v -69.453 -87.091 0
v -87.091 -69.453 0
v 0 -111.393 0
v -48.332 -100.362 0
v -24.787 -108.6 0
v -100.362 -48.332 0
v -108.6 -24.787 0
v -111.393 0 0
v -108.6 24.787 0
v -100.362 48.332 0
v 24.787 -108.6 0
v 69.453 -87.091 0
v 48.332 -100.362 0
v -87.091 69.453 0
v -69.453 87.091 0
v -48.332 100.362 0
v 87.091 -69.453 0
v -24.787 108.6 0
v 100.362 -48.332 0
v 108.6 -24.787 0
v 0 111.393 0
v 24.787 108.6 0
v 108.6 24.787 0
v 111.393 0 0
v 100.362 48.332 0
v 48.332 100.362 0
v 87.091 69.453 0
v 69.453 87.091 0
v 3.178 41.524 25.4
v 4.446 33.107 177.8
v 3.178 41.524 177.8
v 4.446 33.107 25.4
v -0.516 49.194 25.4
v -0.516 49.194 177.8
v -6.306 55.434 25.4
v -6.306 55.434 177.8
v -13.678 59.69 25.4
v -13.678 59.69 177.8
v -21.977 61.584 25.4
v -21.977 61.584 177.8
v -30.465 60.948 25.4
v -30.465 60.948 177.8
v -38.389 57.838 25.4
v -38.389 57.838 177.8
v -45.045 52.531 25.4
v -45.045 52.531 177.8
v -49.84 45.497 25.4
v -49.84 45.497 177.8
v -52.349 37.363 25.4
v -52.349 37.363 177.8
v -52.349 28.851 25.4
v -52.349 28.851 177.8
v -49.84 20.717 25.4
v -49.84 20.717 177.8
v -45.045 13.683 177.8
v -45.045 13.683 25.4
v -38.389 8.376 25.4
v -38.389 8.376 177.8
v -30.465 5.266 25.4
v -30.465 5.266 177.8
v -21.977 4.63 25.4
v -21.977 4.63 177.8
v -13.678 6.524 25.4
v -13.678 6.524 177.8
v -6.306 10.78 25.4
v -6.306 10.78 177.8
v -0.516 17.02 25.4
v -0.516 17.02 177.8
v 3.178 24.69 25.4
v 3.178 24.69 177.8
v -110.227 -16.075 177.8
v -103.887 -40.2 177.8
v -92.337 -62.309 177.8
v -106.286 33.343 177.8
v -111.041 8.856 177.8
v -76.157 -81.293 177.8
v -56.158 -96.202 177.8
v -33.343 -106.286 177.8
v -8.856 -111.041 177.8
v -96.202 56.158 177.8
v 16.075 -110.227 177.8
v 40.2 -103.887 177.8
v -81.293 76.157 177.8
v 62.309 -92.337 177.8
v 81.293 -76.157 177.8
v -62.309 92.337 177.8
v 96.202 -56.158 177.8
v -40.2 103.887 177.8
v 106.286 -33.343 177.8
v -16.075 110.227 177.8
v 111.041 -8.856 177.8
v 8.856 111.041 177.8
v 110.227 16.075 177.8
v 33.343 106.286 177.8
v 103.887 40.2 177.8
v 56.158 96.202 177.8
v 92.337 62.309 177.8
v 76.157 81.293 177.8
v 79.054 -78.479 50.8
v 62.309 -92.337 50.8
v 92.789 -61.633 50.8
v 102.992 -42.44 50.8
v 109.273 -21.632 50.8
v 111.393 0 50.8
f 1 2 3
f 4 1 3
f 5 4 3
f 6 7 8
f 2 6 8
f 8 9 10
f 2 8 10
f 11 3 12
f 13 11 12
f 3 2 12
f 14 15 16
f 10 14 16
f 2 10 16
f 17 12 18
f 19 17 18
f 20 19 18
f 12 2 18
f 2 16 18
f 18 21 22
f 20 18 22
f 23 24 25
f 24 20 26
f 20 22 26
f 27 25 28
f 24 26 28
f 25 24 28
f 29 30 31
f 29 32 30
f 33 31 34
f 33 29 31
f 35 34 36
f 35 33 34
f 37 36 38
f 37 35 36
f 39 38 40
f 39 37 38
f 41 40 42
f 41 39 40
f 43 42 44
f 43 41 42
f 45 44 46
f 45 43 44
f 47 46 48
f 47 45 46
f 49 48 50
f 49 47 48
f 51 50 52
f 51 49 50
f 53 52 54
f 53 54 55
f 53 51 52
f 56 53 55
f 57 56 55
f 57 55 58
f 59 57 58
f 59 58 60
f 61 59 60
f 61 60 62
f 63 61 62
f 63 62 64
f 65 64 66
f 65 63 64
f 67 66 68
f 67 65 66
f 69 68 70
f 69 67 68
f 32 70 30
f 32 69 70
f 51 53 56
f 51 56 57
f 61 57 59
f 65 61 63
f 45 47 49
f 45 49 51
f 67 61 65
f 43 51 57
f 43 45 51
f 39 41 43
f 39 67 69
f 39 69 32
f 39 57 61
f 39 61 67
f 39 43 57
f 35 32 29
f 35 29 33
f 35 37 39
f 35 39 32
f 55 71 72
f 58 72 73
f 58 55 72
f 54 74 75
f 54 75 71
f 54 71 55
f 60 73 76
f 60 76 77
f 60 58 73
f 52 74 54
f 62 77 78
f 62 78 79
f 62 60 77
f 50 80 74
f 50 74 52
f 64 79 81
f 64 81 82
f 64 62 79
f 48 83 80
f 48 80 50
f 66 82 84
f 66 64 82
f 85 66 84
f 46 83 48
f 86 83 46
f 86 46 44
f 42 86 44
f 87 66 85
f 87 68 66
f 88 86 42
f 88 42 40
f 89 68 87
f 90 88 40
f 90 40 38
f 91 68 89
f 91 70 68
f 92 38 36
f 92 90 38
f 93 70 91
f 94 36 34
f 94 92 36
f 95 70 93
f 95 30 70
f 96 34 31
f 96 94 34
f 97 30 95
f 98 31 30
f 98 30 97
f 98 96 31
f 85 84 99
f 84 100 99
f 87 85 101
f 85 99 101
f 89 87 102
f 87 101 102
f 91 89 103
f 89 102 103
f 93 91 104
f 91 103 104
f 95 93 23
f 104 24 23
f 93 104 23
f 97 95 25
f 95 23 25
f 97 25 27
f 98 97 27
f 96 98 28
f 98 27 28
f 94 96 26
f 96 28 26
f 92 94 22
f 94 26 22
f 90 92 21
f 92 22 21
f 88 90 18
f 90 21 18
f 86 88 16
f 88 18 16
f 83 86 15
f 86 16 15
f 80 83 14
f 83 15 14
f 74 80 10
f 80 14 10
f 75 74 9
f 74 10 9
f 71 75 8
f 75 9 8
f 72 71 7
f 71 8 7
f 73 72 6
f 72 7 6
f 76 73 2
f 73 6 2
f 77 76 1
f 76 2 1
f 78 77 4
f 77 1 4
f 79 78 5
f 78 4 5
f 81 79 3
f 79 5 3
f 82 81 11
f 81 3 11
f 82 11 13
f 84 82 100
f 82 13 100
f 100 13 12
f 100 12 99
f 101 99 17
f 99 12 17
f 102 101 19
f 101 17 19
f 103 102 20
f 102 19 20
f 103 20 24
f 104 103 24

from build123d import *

# Parameters (mm, degrees)
F1_R     = 111.3933221295
F2_DEPTH = 25.4
F3_R     = 111.3933221295
F3_R_2   = 28.5570056478
F4_DEPTH = 25.4
F5_W     = 62.3087513292
F5_H     = 49.9088813265
F5_R     = 28.5570056478
F6_DEPTH = 127


with BuildPart() as f2:
    # F1 (on face) → F2 (new body)
    with BuildSketch(Plane.XY):
        Circle(F1_R)
    extrude(amount=F2_DEPTH)

    # F3 (on face) → F4 (join)
    with BuildSketch(Plane.XY.offset(25.4)):
        Circle(F3_R)
        with Locations((-24.1107493639, 33.1069529057)):
            Circle(F3_R_2, mode=Mode.SUBTRACT)
    extrude(amount=F4_DEPTH)

    # F5 (on face) → F6 (join)
    with BuildSketch(Plane.XY.offset(50.8)):
        with BuildLine():
            ThreePointArc((111.3933221295, 0), (-98.359674215, 52.2861999324), (62.3087513292, -92.3368383845))
            ThreePointArc((62.3087513292, -92.3368383845), (98.359674215, -52.2861999324), (111.3933221295, 0))
        make_face()
        with Locations((31.1543756646, -67.3823977212)):
            Rectangle(F5_W, F5_H, mode=Mode.SUBTRACT)
        with Locations((-24.1107493639, 33.1069529057)):
            Circle(F5_R, mode=Mode.SUBTRACT)
        with Locations((31.1543756646, -67.3823977212)):
            Rectangle(F5_W, F5_H)
    extrude(amount=F6_DEPTH)


solid = f2.part
